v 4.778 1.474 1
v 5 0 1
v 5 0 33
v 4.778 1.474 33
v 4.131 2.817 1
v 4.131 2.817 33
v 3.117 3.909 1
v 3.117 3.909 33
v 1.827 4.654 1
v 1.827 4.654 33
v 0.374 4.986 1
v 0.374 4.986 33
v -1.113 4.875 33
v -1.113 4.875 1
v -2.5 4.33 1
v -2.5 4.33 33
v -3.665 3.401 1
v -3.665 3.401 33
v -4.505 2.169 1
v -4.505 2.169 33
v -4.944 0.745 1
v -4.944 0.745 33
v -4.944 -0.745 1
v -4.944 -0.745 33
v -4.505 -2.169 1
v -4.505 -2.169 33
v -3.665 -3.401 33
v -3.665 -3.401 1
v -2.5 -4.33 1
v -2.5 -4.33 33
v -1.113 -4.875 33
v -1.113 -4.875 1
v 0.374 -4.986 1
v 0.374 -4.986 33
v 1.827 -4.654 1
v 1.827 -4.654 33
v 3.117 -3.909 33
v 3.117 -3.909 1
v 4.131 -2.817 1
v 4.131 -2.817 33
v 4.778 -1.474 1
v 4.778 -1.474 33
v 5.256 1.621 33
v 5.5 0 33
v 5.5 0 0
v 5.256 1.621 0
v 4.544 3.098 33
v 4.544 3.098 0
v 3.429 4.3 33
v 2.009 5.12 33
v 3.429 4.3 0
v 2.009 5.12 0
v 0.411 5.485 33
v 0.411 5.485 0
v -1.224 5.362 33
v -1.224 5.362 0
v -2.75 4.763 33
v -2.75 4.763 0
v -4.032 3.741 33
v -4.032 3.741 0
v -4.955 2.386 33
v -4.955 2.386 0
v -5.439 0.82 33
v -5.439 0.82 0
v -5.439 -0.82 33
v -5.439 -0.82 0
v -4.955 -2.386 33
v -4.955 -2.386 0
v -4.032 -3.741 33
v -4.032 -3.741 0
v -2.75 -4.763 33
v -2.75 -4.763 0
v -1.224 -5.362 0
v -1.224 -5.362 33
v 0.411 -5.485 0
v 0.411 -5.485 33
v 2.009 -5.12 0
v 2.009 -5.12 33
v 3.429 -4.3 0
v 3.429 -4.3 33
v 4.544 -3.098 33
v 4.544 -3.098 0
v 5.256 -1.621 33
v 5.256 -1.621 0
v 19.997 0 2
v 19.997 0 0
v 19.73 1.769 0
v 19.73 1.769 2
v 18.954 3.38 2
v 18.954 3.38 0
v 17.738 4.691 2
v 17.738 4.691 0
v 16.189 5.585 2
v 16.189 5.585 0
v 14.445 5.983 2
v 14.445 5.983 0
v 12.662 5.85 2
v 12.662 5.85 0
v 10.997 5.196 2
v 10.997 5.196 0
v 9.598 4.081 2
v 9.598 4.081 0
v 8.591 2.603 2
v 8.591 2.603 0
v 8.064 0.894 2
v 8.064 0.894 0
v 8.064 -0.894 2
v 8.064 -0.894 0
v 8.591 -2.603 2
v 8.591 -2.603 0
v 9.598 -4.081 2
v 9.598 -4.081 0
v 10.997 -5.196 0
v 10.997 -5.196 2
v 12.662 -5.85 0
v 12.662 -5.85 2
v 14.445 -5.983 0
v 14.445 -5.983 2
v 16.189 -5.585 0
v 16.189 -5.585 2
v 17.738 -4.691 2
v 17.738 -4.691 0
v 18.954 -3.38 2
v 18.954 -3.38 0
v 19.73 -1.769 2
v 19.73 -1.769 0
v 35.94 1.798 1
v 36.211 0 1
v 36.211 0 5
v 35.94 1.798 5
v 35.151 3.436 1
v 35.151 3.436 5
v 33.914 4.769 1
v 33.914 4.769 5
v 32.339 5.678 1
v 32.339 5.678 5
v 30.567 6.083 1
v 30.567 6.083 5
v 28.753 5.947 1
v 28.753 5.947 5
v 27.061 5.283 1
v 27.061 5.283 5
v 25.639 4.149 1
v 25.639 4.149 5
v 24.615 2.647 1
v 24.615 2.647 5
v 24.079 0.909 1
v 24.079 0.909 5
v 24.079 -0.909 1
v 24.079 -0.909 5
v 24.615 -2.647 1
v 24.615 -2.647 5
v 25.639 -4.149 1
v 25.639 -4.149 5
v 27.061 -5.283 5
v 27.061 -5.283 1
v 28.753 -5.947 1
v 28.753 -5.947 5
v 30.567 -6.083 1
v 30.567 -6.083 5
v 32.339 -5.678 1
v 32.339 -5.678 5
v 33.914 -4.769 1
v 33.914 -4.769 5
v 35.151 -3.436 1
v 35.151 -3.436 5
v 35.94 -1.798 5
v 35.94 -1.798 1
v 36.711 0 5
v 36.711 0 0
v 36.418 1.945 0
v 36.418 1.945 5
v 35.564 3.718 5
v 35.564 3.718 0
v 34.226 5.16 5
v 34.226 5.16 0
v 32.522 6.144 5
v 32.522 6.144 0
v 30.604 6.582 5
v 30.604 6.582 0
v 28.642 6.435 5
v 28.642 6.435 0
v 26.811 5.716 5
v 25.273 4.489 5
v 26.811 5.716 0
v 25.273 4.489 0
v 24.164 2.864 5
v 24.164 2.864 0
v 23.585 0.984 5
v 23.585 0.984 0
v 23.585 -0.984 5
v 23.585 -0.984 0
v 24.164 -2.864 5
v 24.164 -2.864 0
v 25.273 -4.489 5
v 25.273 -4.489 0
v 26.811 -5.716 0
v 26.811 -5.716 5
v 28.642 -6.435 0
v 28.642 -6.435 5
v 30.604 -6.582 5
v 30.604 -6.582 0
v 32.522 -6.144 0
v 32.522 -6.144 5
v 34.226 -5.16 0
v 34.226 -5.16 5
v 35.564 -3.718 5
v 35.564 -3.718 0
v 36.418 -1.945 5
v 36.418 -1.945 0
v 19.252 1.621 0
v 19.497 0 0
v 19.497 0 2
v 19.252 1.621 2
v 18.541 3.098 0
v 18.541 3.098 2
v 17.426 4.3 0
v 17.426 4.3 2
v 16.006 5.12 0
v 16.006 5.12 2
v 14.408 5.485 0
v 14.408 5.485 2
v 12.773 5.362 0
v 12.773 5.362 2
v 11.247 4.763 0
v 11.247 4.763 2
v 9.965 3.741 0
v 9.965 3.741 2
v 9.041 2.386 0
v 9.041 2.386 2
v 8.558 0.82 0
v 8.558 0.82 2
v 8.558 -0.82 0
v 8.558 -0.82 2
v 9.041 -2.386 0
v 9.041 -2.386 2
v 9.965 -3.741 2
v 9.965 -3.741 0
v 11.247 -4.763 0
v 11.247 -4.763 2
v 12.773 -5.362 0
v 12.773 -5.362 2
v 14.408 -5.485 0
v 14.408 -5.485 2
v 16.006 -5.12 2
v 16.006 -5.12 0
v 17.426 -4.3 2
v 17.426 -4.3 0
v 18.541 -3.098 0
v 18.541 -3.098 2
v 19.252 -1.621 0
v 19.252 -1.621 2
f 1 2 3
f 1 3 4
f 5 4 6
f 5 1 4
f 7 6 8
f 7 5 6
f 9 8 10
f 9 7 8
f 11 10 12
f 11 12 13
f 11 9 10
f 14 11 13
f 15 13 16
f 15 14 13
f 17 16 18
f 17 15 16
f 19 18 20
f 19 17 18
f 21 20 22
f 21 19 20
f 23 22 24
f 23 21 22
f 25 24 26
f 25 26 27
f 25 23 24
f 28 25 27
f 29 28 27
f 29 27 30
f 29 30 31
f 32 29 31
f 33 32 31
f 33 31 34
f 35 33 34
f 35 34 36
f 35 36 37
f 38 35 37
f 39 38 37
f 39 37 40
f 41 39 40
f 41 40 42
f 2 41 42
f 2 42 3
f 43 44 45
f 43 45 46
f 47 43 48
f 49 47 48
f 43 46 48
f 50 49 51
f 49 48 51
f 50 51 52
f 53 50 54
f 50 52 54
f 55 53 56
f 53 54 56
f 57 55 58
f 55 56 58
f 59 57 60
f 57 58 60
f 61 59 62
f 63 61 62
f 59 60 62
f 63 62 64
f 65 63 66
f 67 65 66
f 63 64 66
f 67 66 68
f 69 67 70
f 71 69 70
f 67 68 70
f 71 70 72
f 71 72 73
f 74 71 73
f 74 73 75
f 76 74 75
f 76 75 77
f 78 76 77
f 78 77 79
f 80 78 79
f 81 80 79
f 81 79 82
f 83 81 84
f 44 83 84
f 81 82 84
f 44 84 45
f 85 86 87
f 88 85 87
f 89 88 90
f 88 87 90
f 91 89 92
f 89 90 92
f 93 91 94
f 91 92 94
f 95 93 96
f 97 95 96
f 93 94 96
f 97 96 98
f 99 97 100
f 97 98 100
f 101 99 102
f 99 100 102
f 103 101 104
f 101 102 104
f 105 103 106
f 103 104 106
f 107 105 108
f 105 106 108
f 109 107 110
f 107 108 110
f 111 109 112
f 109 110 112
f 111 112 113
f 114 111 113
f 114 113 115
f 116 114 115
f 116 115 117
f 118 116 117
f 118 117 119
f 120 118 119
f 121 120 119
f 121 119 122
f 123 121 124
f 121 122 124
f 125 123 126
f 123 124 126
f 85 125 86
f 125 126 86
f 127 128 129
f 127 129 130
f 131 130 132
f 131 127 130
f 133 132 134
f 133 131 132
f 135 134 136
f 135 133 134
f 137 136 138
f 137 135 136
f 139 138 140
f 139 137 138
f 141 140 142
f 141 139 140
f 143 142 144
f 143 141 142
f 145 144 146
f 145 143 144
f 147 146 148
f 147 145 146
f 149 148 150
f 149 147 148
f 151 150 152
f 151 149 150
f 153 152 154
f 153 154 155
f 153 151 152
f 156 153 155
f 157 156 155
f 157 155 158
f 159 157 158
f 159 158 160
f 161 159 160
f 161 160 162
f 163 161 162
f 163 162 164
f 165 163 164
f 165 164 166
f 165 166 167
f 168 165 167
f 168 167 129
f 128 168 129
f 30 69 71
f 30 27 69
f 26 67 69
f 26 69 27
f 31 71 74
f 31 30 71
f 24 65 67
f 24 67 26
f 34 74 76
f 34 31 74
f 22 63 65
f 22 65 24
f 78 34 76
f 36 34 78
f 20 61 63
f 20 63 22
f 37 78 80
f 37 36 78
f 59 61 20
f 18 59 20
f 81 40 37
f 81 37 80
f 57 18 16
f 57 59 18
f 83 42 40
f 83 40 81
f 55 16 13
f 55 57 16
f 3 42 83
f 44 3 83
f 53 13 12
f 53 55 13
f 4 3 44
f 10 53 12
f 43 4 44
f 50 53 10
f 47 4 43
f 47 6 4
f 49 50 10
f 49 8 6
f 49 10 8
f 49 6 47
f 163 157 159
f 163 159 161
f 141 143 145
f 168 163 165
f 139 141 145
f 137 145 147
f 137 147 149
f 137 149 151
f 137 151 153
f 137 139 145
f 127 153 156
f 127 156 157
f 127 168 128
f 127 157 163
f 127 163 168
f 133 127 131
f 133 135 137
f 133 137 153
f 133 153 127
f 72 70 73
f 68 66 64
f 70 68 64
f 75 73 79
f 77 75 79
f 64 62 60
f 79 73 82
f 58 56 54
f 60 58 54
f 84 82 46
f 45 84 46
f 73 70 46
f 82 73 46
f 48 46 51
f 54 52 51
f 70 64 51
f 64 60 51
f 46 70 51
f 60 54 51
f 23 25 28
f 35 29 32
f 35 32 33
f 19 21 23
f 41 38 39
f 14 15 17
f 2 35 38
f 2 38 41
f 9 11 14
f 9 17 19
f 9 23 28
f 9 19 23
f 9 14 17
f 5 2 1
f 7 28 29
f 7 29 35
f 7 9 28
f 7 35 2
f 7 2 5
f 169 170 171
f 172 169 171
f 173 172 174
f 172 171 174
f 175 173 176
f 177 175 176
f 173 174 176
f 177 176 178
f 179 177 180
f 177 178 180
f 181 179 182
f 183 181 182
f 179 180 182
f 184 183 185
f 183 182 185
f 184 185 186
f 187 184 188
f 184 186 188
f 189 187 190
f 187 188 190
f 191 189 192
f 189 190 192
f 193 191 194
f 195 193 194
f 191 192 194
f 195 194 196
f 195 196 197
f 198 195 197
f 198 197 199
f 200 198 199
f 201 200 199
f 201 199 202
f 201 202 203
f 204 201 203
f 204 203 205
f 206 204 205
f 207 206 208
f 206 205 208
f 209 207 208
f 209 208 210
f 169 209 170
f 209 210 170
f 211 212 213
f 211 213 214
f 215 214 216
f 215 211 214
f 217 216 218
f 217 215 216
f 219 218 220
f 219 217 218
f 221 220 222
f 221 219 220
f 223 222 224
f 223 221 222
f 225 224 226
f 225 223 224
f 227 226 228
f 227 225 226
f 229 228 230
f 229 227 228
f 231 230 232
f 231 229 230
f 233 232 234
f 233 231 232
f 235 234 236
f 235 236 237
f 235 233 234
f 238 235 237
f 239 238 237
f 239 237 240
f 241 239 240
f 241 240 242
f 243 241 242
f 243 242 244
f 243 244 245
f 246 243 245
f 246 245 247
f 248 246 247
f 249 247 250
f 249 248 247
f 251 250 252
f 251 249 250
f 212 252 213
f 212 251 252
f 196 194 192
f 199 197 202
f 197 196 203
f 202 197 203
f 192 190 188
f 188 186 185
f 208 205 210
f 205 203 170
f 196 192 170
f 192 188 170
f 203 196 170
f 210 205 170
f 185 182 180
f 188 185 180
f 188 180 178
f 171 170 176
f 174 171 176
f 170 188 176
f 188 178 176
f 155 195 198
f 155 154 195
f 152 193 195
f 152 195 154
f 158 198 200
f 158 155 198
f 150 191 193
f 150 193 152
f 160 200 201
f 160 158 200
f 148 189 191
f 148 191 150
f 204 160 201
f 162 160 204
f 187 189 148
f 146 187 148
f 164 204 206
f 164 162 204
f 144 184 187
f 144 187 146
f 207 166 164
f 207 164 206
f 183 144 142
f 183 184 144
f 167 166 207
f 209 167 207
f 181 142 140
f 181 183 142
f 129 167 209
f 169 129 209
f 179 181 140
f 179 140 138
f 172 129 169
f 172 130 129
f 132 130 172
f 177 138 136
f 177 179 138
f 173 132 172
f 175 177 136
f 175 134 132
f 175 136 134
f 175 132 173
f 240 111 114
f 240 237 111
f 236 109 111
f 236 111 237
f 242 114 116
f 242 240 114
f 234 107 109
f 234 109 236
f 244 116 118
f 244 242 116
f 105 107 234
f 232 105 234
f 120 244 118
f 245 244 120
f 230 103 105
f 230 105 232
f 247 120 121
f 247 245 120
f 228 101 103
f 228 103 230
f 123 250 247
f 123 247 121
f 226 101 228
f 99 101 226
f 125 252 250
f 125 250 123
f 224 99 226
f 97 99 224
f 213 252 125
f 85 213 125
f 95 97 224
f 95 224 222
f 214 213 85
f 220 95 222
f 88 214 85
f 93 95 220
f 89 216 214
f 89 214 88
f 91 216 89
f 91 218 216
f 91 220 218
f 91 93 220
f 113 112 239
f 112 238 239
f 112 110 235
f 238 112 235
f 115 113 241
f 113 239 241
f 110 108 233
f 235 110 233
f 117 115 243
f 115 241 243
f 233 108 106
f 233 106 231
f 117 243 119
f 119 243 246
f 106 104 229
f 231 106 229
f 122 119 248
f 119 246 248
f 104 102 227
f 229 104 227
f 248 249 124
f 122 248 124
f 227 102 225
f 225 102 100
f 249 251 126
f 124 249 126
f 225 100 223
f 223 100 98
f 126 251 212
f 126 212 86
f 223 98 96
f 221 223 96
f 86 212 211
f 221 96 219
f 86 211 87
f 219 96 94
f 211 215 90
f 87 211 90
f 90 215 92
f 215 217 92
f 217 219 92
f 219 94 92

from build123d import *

# Parameters (mm, degrees)
F0_R     = 5.5
F0_R_2   = 5
F1_DEPTH = 33
F2_DEPTH = 1
F0_R_3   = 6
F3_DEPTH = 2
F0_R_4   = 6.6
F0_R_5   = 6.1
F4_DEPTH = 5
F5_DEPTH = 1


with BuildPart() as f1:
    # F0 (on Top) → F1 (new body)
    with BuildSketch(Plane.XY):
        Circle(F0_R)
        Circle(F0_R_2, mode=Mode.SUBTRACT)
    extrude(amount=F1_DEPTH)

    # F0 (on Top) → F2 (join)
    with BuildSketch(Plane.XY):
        Circle(F0_R_2)
    extrude(amount=F2_DEPTH)


with BuildPart() as f3:
    # F0 (on Top) → F3 (new body)
    with BuildSketch(Plane.XY):
        with Locations((13.996662, 0)):
            Circle(F0_R_3)
        with Locations((13.996662, 0)):
            Circle(F0_R, mode=Mode.SUBTRACT)
    extrude(amount=F3_DEPTH)


with BuildPart() as f4:
    # F0 (on Top) → F4 (new body)
    with BuildSketch(Plane.XY):
        with Locations((30.110849, 0)):
            Circle(F0_R_4)
        with Locations((30.110849, 0)):
            Circle(F0_R_5, mode=Mode.SUBTRACT)
    extrude(amount=F4_DEPTH)

    # F0 (on Top) → F5 (join)
    with BuildSketch(Plane.XY):
        with Locations((30.110849, 0)):
            Circle(F0_R_5)
    extrude(amount=F5_DEPTH)


solid = Compound([f1.part, f3.part, f4.part])
